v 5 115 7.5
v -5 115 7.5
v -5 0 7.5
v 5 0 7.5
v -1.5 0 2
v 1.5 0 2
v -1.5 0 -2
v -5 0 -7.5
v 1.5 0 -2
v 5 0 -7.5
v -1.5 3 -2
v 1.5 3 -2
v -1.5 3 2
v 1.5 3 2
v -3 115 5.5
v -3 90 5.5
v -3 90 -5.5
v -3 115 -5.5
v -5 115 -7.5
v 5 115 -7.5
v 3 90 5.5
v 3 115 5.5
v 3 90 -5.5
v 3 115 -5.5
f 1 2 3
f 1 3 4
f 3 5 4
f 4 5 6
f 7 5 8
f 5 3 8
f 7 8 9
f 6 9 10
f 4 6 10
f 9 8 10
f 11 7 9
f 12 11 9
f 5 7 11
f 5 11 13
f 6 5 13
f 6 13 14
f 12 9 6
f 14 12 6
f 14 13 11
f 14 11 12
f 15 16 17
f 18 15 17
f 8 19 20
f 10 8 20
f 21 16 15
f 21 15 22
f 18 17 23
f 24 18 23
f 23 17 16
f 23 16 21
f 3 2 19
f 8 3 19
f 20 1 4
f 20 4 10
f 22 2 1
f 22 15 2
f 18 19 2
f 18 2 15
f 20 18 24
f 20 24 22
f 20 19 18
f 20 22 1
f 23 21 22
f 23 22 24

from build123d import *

# Parameters (mm, degrees)
SKETCH1_W           = 10
SKETCH1_H           = 15
BOSS_EXTRUDE1_DEPTH = 115
SKETCH2_W           = 3
SKETCH2_H           = 4
CUT_EXTRUDE1_DEPTH  = 3
SHELL1_START        = 90
SHELL1_OUTLINE_W    = 6
SHELL1_OUTLINE_H    = 11
SHELL1_DEPTH        = 25


# Read off the part's stored shape, not the designer's step: Shell1
with BuildPart() as part:
    # Sketch1 → Boss-Extrude1 (new body)
    with BuildSketch(Plane(origin=(0, 0, 0), x_dir=(1, 0, 0), z_dir=(0, 1, 0))):
        Rectangle(SKETCH1_W, SKETCH1_H)
    extrude(amount=BOSS_EXTRUDE1_DEPTH)

    # Sketch2 → Cut-Extrude1 (cut)
    with BuildSketch(Plane.XZ):
        Rectangle(SKETCH2_W, SKETCH2_H)
    extrude(amount=-CUT_EXTRUDE1_DEPTH, mode=Mode.SUBTRACT)

    # Shell1 outline → Shell1 (cut)
    with BuildSketch(Plane(origin=(0, 0, 0), x_dir=(1, 0, 0), z_dir=(0, 1, 0)).offset(SHELL1_START)):
        Rectangle(SHELL1_OUTLINE_W, SHELL1_OUTLINE_H)
    extrude(amount=SHELL1_DEPTH, mode=Mode.SUBTRACT)


solid = part.part
